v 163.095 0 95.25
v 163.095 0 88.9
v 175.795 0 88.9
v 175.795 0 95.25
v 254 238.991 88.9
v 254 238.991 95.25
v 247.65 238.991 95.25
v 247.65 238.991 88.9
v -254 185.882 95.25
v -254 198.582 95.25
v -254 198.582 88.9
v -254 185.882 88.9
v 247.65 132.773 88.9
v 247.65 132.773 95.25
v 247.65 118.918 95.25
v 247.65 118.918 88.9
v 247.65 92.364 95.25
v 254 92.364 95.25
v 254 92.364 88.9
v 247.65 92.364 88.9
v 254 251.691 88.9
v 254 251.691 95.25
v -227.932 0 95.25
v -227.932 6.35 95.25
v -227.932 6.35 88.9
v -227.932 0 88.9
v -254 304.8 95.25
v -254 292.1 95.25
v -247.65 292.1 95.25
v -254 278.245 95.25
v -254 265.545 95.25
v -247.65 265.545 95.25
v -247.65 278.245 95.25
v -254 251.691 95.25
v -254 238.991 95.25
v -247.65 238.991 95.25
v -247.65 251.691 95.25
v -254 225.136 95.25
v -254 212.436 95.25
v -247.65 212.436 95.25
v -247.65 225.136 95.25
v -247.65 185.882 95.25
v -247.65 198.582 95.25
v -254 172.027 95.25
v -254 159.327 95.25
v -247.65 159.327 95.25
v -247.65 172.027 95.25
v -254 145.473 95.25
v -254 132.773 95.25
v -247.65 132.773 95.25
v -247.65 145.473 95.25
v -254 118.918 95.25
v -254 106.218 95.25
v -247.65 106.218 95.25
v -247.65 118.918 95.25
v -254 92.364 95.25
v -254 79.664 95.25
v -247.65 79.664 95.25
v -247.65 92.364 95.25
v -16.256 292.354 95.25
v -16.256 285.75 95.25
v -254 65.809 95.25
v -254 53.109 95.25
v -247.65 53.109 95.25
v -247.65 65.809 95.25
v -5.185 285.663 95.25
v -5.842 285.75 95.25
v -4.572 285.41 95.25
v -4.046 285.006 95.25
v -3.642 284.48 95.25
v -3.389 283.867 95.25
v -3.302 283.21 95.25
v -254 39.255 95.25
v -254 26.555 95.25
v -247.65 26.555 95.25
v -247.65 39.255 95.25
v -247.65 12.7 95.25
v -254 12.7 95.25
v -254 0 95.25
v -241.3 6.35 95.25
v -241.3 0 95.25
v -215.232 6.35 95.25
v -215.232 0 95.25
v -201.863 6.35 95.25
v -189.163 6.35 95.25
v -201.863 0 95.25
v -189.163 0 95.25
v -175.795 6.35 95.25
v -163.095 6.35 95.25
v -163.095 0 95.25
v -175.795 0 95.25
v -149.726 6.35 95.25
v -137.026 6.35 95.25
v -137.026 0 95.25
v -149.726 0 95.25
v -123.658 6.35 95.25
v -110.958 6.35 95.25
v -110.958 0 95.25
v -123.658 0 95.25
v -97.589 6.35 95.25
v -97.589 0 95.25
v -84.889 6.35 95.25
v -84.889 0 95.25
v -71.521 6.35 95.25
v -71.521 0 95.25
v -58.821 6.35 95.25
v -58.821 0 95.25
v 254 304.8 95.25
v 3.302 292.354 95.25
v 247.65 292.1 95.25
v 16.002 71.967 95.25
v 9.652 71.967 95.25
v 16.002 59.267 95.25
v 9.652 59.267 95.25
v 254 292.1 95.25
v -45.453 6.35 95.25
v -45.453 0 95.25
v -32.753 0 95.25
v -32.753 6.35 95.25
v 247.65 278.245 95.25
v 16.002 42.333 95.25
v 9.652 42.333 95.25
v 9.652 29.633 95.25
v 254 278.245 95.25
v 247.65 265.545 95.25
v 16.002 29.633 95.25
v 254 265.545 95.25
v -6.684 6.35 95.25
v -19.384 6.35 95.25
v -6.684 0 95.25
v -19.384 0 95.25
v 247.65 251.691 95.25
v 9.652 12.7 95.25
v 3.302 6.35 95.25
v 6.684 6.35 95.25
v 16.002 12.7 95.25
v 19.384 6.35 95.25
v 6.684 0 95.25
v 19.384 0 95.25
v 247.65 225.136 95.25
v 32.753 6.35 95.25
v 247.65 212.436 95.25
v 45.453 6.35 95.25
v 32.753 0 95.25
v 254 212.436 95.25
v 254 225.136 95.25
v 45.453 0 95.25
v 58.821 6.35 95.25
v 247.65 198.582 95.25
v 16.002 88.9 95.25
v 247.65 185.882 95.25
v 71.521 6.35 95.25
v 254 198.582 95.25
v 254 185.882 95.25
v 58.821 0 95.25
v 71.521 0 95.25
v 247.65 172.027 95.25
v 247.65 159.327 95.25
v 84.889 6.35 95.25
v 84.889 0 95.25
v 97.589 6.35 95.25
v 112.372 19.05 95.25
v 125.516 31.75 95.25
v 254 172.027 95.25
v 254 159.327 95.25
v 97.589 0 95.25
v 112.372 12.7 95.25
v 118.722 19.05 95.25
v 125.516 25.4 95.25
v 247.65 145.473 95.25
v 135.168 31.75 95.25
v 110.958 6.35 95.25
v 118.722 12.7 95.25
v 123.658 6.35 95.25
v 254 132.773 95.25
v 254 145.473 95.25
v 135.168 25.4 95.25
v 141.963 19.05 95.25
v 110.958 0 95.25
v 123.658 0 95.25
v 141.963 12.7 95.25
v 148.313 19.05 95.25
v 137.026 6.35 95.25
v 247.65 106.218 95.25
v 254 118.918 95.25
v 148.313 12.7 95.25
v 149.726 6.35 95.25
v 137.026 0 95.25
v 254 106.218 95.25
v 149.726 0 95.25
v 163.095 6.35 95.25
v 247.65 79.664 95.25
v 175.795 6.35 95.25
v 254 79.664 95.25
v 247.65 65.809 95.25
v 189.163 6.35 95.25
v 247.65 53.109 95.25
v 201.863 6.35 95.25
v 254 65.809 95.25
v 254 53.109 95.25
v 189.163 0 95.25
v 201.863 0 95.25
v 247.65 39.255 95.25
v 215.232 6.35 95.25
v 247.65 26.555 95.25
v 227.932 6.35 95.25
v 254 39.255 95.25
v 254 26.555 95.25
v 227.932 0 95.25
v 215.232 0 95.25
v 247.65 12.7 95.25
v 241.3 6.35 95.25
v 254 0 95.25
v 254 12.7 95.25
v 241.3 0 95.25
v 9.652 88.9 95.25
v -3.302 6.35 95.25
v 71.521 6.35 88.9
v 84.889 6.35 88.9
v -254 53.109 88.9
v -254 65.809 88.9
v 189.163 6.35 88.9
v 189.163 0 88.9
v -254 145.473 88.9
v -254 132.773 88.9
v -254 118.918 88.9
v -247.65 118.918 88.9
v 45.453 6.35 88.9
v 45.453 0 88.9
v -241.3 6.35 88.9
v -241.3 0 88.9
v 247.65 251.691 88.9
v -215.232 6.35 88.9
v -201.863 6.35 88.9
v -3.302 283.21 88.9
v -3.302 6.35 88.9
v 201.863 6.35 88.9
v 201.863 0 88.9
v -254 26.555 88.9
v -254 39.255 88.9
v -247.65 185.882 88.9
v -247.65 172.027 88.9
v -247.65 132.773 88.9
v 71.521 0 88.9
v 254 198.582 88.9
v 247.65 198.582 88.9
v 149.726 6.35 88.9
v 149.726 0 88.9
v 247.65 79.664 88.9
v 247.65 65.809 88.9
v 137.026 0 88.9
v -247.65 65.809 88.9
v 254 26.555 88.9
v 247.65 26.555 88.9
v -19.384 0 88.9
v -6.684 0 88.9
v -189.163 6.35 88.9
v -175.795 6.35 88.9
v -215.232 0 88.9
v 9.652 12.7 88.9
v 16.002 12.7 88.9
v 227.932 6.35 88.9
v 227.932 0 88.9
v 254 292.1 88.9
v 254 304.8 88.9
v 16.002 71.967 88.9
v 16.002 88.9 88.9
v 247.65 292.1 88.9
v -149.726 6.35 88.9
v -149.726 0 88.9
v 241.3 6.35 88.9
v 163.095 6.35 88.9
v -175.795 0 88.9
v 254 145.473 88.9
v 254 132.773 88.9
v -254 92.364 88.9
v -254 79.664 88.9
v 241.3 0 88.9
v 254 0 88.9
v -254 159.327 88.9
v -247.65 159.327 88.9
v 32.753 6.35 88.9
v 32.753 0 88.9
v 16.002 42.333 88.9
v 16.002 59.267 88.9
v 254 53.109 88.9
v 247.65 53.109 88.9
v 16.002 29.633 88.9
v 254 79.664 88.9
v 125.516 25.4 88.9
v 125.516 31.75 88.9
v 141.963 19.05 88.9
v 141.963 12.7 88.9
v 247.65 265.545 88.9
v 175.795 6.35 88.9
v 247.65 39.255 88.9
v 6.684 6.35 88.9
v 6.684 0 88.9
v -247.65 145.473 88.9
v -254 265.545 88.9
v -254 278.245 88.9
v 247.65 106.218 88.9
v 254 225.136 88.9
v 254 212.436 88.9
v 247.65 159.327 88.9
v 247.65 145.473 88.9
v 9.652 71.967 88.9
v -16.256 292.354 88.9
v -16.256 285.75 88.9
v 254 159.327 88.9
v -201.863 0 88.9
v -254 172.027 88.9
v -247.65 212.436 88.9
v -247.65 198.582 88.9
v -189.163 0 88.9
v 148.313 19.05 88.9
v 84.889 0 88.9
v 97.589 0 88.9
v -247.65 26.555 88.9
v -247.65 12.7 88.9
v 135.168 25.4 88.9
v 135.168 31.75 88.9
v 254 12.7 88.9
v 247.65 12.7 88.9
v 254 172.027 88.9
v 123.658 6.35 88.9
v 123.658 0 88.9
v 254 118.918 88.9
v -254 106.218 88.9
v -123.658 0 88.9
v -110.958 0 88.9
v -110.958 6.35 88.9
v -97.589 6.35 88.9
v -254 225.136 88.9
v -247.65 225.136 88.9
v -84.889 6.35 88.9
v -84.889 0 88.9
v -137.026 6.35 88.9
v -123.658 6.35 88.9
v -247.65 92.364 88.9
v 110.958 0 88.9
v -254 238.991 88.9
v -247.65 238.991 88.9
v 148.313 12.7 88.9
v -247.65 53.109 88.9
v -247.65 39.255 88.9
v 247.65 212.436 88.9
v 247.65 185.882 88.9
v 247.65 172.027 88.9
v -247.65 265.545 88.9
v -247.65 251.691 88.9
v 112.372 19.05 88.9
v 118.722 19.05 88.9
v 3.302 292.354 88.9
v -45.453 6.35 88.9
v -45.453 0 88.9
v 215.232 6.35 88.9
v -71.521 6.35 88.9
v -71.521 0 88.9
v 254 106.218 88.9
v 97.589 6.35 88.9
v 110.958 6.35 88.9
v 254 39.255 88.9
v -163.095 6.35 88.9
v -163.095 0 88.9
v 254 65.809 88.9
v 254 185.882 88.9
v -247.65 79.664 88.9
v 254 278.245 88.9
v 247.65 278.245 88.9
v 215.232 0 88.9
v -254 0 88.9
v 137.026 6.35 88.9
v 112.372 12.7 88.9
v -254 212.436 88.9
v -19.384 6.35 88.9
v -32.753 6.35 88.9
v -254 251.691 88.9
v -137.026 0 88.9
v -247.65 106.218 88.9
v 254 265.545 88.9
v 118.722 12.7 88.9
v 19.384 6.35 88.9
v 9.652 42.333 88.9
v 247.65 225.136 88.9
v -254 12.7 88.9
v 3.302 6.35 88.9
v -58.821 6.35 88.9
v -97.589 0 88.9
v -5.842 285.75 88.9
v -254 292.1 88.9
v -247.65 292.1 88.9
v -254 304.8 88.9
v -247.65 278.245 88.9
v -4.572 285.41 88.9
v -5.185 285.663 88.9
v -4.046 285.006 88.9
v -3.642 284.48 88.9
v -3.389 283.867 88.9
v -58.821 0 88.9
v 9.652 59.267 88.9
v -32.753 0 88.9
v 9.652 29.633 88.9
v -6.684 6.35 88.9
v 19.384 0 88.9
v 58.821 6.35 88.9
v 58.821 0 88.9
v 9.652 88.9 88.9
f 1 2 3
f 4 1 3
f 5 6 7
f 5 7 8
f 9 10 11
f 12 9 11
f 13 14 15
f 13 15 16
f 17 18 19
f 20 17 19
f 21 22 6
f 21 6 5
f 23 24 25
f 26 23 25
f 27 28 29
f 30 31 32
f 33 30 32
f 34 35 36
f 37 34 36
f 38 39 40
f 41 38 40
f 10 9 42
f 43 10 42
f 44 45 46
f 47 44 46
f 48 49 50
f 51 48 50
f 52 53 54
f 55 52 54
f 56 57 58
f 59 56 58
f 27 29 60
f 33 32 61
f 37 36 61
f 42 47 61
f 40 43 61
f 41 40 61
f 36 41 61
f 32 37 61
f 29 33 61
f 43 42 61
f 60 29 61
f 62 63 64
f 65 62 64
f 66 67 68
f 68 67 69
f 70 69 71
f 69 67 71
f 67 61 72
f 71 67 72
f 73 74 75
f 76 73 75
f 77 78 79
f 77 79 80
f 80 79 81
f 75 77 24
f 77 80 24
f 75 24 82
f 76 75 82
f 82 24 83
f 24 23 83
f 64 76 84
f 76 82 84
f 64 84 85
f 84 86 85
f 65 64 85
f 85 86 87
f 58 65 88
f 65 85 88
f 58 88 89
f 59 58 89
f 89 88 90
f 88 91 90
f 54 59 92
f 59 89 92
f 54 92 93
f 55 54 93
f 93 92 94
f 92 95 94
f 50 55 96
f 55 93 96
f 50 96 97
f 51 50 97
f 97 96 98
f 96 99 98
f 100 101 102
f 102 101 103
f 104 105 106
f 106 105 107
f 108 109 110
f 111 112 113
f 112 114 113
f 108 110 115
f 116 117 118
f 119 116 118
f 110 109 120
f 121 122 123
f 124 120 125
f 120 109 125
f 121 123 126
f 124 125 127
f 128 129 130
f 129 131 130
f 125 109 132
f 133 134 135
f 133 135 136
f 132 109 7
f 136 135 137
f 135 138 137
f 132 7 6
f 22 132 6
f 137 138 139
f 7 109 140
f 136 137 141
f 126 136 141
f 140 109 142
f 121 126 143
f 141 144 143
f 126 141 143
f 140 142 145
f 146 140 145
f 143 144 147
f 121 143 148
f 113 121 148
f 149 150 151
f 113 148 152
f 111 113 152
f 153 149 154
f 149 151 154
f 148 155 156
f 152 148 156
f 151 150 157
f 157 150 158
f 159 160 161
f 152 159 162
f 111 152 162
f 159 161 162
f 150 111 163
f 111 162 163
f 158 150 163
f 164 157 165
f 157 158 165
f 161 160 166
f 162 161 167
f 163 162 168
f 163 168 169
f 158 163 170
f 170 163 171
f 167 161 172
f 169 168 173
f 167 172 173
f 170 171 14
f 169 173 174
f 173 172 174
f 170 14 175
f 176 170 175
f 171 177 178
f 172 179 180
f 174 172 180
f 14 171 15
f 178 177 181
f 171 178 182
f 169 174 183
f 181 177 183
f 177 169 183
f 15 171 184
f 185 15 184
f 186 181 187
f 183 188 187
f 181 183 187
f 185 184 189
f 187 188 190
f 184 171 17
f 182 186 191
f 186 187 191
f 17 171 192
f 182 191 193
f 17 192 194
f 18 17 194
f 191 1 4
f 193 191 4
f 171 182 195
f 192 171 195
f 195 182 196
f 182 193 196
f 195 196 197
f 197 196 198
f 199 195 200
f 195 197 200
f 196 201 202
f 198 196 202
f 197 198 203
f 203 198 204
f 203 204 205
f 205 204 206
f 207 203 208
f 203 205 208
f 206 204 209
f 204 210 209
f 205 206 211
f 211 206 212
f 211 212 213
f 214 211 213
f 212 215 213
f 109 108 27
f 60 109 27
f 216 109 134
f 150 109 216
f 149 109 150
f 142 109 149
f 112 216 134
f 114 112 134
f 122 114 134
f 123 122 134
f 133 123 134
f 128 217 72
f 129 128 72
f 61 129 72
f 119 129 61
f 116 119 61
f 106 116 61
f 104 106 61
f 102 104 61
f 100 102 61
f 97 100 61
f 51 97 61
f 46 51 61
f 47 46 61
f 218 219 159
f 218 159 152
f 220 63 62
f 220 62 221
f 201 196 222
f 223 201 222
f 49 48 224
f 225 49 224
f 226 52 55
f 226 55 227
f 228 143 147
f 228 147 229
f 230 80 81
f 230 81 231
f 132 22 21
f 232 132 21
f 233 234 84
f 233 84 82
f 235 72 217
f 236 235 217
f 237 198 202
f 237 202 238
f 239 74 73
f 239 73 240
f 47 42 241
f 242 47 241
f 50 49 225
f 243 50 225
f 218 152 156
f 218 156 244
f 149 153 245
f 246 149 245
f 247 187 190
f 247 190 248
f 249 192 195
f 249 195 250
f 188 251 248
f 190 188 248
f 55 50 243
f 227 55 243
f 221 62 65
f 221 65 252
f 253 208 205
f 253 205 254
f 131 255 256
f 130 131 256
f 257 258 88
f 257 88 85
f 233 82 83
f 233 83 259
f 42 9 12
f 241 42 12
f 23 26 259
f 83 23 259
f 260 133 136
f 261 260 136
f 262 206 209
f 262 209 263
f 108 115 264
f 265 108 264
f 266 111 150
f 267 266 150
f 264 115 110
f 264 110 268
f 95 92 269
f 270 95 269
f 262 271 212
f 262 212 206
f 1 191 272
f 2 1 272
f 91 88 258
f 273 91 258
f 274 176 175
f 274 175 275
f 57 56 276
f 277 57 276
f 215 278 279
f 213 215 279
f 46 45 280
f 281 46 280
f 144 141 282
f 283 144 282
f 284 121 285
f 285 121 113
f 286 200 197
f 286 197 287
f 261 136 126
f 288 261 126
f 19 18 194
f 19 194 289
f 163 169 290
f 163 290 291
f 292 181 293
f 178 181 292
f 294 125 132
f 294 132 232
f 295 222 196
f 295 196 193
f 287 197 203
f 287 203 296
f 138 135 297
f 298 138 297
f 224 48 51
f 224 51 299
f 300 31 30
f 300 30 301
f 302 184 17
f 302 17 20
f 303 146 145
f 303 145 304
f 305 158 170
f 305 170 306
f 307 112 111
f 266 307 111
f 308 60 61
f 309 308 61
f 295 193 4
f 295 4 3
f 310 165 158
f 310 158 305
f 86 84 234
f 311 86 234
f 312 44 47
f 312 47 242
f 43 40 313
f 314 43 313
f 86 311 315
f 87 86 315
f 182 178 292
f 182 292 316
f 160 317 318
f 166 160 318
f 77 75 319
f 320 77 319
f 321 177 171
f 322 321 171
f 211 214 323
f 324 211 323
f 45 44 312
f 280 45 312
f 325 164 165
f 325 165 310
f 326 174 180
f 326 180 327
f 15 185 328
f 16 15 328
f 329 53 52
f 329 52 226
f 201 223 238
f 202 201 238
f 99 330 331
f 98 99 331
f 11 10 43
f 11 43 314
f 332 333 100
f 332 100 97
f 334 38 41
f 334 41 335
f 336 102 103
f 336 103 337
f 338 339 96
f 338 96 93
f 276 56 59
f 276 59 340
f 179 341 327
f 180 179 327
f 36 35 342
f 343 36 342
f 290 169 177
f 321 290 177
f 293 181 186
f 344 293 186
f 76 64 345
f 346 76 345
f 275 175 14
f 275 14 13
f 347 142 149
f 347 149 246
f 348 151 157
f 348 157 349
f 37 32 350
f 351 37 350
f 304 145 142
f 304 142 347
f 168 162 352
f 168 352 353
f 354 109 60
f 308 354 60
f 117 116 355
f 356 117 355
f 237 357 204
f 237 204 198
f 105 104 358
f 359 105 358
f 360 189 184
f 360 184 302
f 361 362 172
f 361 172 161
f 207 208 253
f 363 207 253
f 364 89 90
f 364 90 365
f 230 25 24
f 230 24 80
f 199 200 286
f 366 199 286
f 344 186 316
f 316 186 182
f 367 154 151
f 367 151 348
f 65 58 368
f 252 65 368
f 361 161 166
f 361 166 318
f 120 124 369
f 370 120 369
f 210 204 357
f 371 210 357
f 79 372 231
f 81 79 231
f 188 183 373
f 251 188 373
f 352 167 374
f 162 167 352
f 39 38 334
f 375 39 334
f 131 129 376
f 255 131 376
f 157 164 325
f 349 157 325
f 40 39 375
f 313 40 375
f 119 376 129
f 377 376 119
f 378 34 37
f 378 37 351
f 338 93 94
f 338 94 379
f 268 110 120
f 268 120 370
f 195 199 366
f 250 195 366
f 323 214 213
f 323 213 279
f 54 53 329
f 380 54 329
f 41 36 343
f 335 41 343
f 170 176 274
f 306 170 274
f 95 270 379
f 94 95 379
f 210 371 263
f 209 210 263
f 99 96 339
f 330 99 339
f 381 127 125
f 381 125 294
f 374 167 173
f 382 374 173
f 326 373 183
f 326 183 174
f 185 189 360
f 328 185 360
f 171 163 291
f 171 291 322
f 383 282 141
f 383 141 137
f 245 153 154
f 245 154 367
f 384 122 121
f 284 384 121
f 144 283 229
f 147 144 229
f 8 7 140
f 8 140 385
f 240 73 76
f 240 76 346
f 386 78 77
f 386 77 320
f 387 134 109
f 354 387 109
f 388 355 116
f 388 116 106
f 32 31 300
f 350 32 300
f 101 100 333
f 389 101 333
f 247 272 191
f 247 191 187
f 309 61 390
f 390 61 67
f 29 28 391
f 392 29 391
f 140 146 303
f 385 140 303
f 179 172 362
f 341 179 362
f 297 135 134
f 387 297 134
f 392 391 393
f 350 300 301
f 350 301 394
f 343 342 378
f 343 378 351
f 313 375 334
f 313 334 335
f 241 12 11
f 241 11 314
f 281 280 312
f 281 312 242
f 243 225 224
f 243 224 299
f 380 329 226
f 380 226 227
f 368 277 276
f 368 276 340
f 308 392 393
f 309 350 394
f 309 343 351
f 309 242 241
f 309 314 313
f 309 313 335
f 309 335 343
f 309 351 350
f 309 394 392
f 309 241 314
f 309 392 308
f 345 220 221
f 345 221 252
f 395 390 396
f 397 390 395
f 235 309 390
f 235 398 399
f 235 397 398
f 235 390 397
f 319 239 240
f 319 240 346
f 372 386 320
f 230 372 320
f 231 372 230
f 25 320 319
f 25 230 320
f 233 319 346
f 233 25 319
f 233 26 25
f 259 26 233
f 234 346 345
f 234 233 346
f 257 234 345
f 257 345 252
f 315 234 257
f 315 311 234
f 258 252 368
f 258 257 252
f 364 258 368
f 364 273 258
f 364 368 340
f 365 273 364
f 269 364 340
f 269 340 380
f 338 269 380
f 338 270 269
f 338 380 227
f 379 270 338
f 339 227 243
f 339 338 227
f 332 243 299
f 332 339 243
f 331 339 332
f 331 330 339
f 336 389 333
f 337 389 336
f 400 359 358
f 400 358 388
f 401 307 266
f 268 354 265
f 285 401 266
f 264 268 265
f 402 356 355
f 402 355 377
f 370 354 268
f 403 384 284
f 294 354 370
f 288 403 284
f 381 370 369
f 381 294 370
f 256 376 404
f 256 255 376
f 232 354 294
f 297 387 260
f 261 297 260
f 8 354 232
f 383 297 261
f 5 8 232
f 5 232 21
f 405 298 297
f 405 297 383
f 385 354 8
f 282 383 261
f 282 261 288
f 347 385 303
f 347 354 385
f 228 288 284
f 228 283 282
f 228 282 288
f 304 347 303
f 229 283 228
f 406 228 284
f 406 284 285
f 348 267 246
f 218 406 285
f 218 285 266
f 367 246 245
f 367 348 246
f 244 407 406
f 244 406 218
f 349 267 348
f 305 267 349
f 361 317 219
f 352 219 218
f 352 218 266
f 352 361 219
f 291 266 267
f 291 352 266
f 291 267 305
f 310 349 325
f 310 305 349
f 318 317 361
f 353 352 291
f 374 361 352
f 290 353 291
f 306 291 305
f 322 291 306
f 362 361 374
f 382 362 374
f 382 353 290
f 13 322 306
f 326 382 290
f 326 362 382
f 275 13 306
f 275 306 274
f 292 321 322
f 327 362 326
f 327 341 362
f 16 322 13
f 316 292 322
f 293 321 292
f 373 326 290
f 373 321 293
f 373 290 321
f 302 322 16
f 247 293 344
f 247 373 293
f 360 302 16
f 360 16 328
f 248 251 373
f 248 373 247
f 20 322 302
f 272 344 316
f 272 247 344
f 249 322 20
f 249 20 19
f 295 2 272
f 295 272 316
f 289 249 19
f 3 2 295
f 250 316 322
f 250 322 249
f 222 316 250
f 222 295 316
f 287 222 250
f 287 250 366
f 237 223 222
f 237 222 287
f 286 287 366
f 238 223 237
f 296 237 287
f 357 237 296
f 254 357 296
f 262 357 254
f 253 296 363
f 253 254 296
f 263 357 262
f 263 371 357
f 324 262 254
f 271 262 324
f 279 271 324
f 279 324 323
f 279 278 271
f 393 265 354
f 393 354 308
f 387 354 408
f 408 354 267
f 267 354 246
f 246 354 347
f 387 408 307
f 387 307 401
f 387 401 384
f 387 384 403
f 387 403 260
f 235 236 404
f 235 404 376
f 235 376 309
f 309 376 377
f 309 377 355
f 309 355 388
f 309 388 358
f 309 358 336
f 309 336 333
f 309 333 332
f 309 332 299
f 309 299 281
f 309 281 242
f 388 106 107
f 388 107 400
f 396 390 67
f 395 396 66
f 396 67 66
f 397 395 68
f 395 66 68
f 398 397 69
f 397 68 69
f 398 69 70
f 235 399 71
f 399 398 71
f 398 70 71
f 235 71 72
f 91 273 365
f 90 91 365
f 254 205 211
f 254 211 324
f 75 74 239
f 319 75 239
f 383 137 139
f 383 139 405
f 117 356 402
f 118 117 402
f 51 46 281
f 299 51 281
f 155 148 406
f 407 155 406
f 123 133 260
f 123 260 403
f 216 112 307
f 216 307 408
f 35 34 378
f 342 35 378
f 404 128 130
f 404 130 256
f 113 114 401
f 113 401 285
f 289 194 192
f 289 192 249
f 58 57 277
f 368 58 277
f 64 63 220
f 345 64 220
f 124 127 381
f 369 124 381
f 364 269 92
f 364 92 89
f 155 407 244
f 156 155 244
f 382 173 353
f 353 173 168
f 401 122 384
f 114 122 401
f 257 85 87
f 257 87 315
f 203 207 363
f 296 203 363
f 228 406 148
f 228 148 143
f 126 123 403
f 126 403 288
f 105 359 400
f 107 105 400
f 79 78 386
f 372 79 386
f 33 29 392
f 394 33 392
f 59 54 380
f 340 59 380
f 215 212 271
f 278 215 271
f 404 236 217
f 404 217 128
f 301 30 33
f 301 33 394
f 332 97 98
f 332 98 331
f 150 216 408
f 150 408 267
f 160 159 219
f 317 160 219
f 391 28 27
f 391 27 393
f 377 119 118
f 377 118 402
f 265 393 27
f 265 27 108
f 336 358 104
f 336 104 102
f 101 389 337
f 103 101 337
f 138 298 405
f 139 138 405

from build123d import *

# Parameters (mm, degrees)
SKETCH1_W           = 508
SKETCH1_H           = 190.5
BOSS_EXTRUDE1_DEPTH = 6.35
SKETCH2_W           = 508
SKETCH2_H           = 190.5
SKETCH2_W_2         = 495.3
SKETCH2_H_2         = 177.8
BOSS_EXTRUDE2_DEPTH = 298.45
SKETCH3_W           = 6.35
SKETCH3_H           = 16.933333333
SKETCH3_H_2         = 16.933333334
CUT_EXTRUDE1_DEPTH  = 12.7
SKETCH4_W           = 6.35
SKETCH4_H           = 15.875
CUT_EXTRUDE2_DEPTH  = 6.35
SKETCH6_W           = 551.127140902
SKETCH6_H           = 227.623239157
CUT_EXTRUDE5_DEPTH  = 305.8
SKETCH5_W           = 13.368421053
SKETCH5_H           = 6.35
SKETCH5_W_2         = 13.368421052
CUT_EXTRUDE6_DEPTH  = 6.35
SKETCH7_W           = 6.35
SKETCH7_H           = 13.854545455
SKETCH7_H_2         = 13.854545454
CUT_EXTRUDE7_DEPTH  = 6.35
SKETCH8_W           = 9.652
SKETCH8_H           = 6.35
SKETCH8_W_2         = 6.35
LEVER_HOLE_DEPTH    = 7.35


with BuildPart() as part:
    # Sketch1 → Boss-Extrude1 (new body)
    with BuildSketch(Plane(origin=(0, 0, 0), x_dir=(1, 0, 0), z_dir=(0, 1, 0))):
        Rectangle(SKETCH1_W, SKETCH1_H)
    extrude(amount=BOSS_EXTRUDE1_DEPTH)

    # Sketch2 → Boss-Extrude2 (add)
    with BuildSketch(Plane(origin=(0, 6.35, 0), x_dir=(1, 0, 0), z_dir=(0, 1, 0))):
        Rectangle(SKETCH2_W, SKETCH2_H)
        Rectangle(SKETCH2_W_2, SKETCH2_H_2, mode=Mode.SUBTRACT)
    extrude(amount=BOSS_EXTRUDE2_DEPTH)

    # Sketch3 → Cut-Extrude1 (cut)
    with BuildSketch(Plane.XY.offset(95.25)):
        with BuildLine():
            Line((-3.302, 283.21), (-3.302, 6.35))
            Line((-3.302, 6.35), (3.302, 6.35))
            Line((3.302, 6.35), (3.302, 292.354))
            Line((3.302, 292.354), (-16.256, 292.354))
            Line((-16.256, 292.354), (-16.256, 285.75))
            Line((-16.256, 285.75), (-5.842, 285.75))
            ThreePointArc((-5.842, 285.75), (-4.045948776, 285.006051224), (-3.302, 283.21))
        make_face()
        with Locations((12.827, 80.433333334)):
            Rectangle(SKETCH3_W, SKETCH3_H)
        with Locations((12.827, 50.8)):
            Rectangle(SKETCH3_W, SKETCH3_H_2)
        with Locations((12.827, 21.166666667)):
            Rectangle(SKETCH3_W, SKETCH3_H)
    extrude(amount=-CUT_EXTRUDE1_DEPTH, mode=Mode.SUBTRACT)

    # Sketch4 → Cut-Extrude2 (cut)
    with BuildSketch(Plane.XY.offset(-88.9)):
        with Locations((-19.431, 284.1625)):
            Rectangle(SKETCH4_W, SKETCH4_H)
        with Locations((-19.431, 255.5875)):
            Rectangle(SKETCH4_W, SKETCH4_H)
        with Locations((-19.431, 227.0125)):
            Rectangle(SKETCH4_W, SKETCH4_H)
        with Locations((-19.431, 198.4375)):
            Rectangle(SKETCH4_W, SKETCH4_H)
        with Locations((-19.431, 169.8625)):
            Rectangle(SKETCH4_W, SKETCH4_H)
        with Locations((-19.431, 141.2875)):
            Rectangle(SKETCH4_W, SKETCH4_H)
        with Locations((-19.431, 112.7125)):
            Rectangle(SKETCH4_W, SKETCH4_H)
        with Locations((-19.431, 84.1375)):
            Rectangle(SKETCH4_W, SKETCH4_H)
        with Locations((-19.431, 55.5625)):
            Rectangle(SKETCH4_W, SKETCH4_H)
        with Locations((-19.431, 26.9875)):
            Rectangle(SKETCH4_W, SKETCH4_H)
    cut_extrude2 = extrude(amount=-CUT_EXTRUDE2_DEPTH, mode=Mode.SUBTRACT)

    # Mirror1: Cut-Extrude2 across plane
    add(cut_extrude2.mirror(Plane.ZY.offset(6.477)), mode=Mode.SUBTRACT)

    # Sketch6 → Cut-Extrude5 (cut, through all)
    with BuildSketch(Plane(origin=(0, 0, 0), x_dir=(1, 0, 0), z_dir=(0, 1, 0))):
        with Locations((15.161260543, 24.911619578)):
            Rectangle(SKETCH6_W, SKETCH6_H)
    extrude(amount=CUT_EXTRUDE5_DEPTH, mode=Mode.SUBTRACT)

    # Sketch5 → Cut-Extrude6 (cut)
    with BuildSketch(Plane(origin=(0, 0, 0), x_dir=(-1, 0, 0), z_dir=(0, -1, 0))):
        with Locations((-234.615789474, -92.075)):
            Rectangle(SKETCH5_W, SKETCH5_H)
        with Locations((-208.547368421, -92.075)):
            Rectangle(SKETCH5_W_2, SKETCH5_H)
        with Locations((-182.478947369, -92.075)):
            Rectangle(SKETCH5_W, SKETCH5_H)
        with Locations((-156.410526316, -92.075)):
            Rectangle(SKETCH5_W, SKETCH5_H)
        with Locations((-130.342105263, -92.075)):
            Rectangle(SKETCH5_W_2, SKETCH5_H)
        with Locations((-104.273684211, -92.075)):
            Rectangle(SKETCH5_W, SKETCH5_H)
        with Locations((-78.205263158, -92.075)):
            Rectangle(SKETCH5_W_2, SKETCH5_H)
        with Locations((-52.136842106, -92.075)):
            Rectangle(SKETCH5_W, SKETCH5_H)
        with Locations((-26.068421052, -92.075)):
            Rectangle(SKETCH5_W, SKETCH5_H)
        with Locations((0, -92.075)):
            Rectangle(SKETCH5_W_2, SKETCH5_H)
        with Locations((26.068421052, -92.075)):
            Rectangle(SKETCH5_W, SKETCH5_H)
        with Locations((52.136842106, -92.075)):
            Rectangle(SKETCH5_W, SKETCH5_H)
        with Locations((78.205263158, -92.075)):
            Rectangle(SKETCH5_W_2, SKETCH5_H)
        with Locations((104.273684211, -92.075)):
            Rectangle(SKETCH5_W, SKETCH5_H)
        with Locations((130.342105263, -92.075)):
            Rectangle(SKETCH5_W_2, SKETCH5_H)
        with Locations((156.410526316, -92.075)):
            Rectangle(SKETCH5_W, SKETCH5_H)
        with Locations((182.478947369, -92.075)):
            Rectangle(SKETCH5_W, SKETCH5_H)
        with Locations((208.547368421, -92.075)):
            Rectangle(SKETCH5_W_2, SKETCH5_H)
        with Locations((234.615789474, -92.075)):
            Rectangle(SKETCH5_W, SKETCH5_H)
    extrude(amount=-CUT_EXTRUDE6_DEPTH, mode=Mode.SUBTRACT)

    # Sketch7 → Cut-Extrude7 (cut)
    with BuildSketch(Plane(origin=(254, 0, 0), x_dir=(0, 0, -1), z_dir=(1, 0, 0))):
        with Locations((-92.075, 285.172727273)):
            Rectangle(SKETCH7_W, SKETCH7_H)
        with Locations((-92.075, 258.618181818)):
            Rectangle(SKETCH7_W, SKETCH7_H_2)
        with Locations((-92.075, 232.063636364)):
            Rectangle(SKETCH7_W, SKETCH7_H)
        with Locations((-92.075, 205.509090909)):
            Rectangle(SKETCH7_W, SKETCH7_H_2)
        with Locations((-92.075, 178.954545455)):
            Rectangle(SKETCH7_W, SKETCH7_H)
        with Locations((-92.075, 152.4)):
            Rectangle(SKETCH7_W, SKETCH7_H_2)
        with Locations((-92.075, 125.845454546)):
            Rectangle(SKETCH7_W, SKETCH7_H)
        with Locations((-92.075, 99.290909091)):
            Rectangle(SKETCH7_W, SKETCH7_H_2)
        with Locations((-92.075, 72.736363637)):
            Rectangle(SKETCH7_W, SKETCH7_H)
        with Locations((-92.075, 46.181818182)):
            Rectangle(SKETCH7_W, SKETCH7_H_2)
        with Locations((-92.075, 19.627272728)):
            Rectangle(SKETCH7_W, SKETCH7_H)
    cut_extrude7 = extrude(amount=-CUT_EXTRUDE7_DEPTH, mode=Mode.SUBTRACT)

    # Mirror2: Cut-Extrude7 across plane
    add(cut_extrude7.mirror(Plane(origin=(0, 0, 0), x_dir=(0, 0, 1), z_dir=(1, 0, 0))), mode=Mode.SUBTRACT)

    # Sketch8 → Lever Hole (cut, through all)
    with BuildSketch(Plane.XY.offset(95.25)):
        with Locations((130.342105263, 28.575)):
            Rectangle(SKETCH8_W, SKETCH8_H)
        with Locations((115.546605263, 15.875)):
            Rectangle(SKETCH8_W_2, SKETCH8_H)
        with Locations((145.137605263, 15.875)):
            Rectangle(SKETCH8_W_2, SKETCH8_H)
    extrude(amount=-LEVER_HOLE_DEPTH, mode=Mode.SUBTRACT)


solid = part.part
